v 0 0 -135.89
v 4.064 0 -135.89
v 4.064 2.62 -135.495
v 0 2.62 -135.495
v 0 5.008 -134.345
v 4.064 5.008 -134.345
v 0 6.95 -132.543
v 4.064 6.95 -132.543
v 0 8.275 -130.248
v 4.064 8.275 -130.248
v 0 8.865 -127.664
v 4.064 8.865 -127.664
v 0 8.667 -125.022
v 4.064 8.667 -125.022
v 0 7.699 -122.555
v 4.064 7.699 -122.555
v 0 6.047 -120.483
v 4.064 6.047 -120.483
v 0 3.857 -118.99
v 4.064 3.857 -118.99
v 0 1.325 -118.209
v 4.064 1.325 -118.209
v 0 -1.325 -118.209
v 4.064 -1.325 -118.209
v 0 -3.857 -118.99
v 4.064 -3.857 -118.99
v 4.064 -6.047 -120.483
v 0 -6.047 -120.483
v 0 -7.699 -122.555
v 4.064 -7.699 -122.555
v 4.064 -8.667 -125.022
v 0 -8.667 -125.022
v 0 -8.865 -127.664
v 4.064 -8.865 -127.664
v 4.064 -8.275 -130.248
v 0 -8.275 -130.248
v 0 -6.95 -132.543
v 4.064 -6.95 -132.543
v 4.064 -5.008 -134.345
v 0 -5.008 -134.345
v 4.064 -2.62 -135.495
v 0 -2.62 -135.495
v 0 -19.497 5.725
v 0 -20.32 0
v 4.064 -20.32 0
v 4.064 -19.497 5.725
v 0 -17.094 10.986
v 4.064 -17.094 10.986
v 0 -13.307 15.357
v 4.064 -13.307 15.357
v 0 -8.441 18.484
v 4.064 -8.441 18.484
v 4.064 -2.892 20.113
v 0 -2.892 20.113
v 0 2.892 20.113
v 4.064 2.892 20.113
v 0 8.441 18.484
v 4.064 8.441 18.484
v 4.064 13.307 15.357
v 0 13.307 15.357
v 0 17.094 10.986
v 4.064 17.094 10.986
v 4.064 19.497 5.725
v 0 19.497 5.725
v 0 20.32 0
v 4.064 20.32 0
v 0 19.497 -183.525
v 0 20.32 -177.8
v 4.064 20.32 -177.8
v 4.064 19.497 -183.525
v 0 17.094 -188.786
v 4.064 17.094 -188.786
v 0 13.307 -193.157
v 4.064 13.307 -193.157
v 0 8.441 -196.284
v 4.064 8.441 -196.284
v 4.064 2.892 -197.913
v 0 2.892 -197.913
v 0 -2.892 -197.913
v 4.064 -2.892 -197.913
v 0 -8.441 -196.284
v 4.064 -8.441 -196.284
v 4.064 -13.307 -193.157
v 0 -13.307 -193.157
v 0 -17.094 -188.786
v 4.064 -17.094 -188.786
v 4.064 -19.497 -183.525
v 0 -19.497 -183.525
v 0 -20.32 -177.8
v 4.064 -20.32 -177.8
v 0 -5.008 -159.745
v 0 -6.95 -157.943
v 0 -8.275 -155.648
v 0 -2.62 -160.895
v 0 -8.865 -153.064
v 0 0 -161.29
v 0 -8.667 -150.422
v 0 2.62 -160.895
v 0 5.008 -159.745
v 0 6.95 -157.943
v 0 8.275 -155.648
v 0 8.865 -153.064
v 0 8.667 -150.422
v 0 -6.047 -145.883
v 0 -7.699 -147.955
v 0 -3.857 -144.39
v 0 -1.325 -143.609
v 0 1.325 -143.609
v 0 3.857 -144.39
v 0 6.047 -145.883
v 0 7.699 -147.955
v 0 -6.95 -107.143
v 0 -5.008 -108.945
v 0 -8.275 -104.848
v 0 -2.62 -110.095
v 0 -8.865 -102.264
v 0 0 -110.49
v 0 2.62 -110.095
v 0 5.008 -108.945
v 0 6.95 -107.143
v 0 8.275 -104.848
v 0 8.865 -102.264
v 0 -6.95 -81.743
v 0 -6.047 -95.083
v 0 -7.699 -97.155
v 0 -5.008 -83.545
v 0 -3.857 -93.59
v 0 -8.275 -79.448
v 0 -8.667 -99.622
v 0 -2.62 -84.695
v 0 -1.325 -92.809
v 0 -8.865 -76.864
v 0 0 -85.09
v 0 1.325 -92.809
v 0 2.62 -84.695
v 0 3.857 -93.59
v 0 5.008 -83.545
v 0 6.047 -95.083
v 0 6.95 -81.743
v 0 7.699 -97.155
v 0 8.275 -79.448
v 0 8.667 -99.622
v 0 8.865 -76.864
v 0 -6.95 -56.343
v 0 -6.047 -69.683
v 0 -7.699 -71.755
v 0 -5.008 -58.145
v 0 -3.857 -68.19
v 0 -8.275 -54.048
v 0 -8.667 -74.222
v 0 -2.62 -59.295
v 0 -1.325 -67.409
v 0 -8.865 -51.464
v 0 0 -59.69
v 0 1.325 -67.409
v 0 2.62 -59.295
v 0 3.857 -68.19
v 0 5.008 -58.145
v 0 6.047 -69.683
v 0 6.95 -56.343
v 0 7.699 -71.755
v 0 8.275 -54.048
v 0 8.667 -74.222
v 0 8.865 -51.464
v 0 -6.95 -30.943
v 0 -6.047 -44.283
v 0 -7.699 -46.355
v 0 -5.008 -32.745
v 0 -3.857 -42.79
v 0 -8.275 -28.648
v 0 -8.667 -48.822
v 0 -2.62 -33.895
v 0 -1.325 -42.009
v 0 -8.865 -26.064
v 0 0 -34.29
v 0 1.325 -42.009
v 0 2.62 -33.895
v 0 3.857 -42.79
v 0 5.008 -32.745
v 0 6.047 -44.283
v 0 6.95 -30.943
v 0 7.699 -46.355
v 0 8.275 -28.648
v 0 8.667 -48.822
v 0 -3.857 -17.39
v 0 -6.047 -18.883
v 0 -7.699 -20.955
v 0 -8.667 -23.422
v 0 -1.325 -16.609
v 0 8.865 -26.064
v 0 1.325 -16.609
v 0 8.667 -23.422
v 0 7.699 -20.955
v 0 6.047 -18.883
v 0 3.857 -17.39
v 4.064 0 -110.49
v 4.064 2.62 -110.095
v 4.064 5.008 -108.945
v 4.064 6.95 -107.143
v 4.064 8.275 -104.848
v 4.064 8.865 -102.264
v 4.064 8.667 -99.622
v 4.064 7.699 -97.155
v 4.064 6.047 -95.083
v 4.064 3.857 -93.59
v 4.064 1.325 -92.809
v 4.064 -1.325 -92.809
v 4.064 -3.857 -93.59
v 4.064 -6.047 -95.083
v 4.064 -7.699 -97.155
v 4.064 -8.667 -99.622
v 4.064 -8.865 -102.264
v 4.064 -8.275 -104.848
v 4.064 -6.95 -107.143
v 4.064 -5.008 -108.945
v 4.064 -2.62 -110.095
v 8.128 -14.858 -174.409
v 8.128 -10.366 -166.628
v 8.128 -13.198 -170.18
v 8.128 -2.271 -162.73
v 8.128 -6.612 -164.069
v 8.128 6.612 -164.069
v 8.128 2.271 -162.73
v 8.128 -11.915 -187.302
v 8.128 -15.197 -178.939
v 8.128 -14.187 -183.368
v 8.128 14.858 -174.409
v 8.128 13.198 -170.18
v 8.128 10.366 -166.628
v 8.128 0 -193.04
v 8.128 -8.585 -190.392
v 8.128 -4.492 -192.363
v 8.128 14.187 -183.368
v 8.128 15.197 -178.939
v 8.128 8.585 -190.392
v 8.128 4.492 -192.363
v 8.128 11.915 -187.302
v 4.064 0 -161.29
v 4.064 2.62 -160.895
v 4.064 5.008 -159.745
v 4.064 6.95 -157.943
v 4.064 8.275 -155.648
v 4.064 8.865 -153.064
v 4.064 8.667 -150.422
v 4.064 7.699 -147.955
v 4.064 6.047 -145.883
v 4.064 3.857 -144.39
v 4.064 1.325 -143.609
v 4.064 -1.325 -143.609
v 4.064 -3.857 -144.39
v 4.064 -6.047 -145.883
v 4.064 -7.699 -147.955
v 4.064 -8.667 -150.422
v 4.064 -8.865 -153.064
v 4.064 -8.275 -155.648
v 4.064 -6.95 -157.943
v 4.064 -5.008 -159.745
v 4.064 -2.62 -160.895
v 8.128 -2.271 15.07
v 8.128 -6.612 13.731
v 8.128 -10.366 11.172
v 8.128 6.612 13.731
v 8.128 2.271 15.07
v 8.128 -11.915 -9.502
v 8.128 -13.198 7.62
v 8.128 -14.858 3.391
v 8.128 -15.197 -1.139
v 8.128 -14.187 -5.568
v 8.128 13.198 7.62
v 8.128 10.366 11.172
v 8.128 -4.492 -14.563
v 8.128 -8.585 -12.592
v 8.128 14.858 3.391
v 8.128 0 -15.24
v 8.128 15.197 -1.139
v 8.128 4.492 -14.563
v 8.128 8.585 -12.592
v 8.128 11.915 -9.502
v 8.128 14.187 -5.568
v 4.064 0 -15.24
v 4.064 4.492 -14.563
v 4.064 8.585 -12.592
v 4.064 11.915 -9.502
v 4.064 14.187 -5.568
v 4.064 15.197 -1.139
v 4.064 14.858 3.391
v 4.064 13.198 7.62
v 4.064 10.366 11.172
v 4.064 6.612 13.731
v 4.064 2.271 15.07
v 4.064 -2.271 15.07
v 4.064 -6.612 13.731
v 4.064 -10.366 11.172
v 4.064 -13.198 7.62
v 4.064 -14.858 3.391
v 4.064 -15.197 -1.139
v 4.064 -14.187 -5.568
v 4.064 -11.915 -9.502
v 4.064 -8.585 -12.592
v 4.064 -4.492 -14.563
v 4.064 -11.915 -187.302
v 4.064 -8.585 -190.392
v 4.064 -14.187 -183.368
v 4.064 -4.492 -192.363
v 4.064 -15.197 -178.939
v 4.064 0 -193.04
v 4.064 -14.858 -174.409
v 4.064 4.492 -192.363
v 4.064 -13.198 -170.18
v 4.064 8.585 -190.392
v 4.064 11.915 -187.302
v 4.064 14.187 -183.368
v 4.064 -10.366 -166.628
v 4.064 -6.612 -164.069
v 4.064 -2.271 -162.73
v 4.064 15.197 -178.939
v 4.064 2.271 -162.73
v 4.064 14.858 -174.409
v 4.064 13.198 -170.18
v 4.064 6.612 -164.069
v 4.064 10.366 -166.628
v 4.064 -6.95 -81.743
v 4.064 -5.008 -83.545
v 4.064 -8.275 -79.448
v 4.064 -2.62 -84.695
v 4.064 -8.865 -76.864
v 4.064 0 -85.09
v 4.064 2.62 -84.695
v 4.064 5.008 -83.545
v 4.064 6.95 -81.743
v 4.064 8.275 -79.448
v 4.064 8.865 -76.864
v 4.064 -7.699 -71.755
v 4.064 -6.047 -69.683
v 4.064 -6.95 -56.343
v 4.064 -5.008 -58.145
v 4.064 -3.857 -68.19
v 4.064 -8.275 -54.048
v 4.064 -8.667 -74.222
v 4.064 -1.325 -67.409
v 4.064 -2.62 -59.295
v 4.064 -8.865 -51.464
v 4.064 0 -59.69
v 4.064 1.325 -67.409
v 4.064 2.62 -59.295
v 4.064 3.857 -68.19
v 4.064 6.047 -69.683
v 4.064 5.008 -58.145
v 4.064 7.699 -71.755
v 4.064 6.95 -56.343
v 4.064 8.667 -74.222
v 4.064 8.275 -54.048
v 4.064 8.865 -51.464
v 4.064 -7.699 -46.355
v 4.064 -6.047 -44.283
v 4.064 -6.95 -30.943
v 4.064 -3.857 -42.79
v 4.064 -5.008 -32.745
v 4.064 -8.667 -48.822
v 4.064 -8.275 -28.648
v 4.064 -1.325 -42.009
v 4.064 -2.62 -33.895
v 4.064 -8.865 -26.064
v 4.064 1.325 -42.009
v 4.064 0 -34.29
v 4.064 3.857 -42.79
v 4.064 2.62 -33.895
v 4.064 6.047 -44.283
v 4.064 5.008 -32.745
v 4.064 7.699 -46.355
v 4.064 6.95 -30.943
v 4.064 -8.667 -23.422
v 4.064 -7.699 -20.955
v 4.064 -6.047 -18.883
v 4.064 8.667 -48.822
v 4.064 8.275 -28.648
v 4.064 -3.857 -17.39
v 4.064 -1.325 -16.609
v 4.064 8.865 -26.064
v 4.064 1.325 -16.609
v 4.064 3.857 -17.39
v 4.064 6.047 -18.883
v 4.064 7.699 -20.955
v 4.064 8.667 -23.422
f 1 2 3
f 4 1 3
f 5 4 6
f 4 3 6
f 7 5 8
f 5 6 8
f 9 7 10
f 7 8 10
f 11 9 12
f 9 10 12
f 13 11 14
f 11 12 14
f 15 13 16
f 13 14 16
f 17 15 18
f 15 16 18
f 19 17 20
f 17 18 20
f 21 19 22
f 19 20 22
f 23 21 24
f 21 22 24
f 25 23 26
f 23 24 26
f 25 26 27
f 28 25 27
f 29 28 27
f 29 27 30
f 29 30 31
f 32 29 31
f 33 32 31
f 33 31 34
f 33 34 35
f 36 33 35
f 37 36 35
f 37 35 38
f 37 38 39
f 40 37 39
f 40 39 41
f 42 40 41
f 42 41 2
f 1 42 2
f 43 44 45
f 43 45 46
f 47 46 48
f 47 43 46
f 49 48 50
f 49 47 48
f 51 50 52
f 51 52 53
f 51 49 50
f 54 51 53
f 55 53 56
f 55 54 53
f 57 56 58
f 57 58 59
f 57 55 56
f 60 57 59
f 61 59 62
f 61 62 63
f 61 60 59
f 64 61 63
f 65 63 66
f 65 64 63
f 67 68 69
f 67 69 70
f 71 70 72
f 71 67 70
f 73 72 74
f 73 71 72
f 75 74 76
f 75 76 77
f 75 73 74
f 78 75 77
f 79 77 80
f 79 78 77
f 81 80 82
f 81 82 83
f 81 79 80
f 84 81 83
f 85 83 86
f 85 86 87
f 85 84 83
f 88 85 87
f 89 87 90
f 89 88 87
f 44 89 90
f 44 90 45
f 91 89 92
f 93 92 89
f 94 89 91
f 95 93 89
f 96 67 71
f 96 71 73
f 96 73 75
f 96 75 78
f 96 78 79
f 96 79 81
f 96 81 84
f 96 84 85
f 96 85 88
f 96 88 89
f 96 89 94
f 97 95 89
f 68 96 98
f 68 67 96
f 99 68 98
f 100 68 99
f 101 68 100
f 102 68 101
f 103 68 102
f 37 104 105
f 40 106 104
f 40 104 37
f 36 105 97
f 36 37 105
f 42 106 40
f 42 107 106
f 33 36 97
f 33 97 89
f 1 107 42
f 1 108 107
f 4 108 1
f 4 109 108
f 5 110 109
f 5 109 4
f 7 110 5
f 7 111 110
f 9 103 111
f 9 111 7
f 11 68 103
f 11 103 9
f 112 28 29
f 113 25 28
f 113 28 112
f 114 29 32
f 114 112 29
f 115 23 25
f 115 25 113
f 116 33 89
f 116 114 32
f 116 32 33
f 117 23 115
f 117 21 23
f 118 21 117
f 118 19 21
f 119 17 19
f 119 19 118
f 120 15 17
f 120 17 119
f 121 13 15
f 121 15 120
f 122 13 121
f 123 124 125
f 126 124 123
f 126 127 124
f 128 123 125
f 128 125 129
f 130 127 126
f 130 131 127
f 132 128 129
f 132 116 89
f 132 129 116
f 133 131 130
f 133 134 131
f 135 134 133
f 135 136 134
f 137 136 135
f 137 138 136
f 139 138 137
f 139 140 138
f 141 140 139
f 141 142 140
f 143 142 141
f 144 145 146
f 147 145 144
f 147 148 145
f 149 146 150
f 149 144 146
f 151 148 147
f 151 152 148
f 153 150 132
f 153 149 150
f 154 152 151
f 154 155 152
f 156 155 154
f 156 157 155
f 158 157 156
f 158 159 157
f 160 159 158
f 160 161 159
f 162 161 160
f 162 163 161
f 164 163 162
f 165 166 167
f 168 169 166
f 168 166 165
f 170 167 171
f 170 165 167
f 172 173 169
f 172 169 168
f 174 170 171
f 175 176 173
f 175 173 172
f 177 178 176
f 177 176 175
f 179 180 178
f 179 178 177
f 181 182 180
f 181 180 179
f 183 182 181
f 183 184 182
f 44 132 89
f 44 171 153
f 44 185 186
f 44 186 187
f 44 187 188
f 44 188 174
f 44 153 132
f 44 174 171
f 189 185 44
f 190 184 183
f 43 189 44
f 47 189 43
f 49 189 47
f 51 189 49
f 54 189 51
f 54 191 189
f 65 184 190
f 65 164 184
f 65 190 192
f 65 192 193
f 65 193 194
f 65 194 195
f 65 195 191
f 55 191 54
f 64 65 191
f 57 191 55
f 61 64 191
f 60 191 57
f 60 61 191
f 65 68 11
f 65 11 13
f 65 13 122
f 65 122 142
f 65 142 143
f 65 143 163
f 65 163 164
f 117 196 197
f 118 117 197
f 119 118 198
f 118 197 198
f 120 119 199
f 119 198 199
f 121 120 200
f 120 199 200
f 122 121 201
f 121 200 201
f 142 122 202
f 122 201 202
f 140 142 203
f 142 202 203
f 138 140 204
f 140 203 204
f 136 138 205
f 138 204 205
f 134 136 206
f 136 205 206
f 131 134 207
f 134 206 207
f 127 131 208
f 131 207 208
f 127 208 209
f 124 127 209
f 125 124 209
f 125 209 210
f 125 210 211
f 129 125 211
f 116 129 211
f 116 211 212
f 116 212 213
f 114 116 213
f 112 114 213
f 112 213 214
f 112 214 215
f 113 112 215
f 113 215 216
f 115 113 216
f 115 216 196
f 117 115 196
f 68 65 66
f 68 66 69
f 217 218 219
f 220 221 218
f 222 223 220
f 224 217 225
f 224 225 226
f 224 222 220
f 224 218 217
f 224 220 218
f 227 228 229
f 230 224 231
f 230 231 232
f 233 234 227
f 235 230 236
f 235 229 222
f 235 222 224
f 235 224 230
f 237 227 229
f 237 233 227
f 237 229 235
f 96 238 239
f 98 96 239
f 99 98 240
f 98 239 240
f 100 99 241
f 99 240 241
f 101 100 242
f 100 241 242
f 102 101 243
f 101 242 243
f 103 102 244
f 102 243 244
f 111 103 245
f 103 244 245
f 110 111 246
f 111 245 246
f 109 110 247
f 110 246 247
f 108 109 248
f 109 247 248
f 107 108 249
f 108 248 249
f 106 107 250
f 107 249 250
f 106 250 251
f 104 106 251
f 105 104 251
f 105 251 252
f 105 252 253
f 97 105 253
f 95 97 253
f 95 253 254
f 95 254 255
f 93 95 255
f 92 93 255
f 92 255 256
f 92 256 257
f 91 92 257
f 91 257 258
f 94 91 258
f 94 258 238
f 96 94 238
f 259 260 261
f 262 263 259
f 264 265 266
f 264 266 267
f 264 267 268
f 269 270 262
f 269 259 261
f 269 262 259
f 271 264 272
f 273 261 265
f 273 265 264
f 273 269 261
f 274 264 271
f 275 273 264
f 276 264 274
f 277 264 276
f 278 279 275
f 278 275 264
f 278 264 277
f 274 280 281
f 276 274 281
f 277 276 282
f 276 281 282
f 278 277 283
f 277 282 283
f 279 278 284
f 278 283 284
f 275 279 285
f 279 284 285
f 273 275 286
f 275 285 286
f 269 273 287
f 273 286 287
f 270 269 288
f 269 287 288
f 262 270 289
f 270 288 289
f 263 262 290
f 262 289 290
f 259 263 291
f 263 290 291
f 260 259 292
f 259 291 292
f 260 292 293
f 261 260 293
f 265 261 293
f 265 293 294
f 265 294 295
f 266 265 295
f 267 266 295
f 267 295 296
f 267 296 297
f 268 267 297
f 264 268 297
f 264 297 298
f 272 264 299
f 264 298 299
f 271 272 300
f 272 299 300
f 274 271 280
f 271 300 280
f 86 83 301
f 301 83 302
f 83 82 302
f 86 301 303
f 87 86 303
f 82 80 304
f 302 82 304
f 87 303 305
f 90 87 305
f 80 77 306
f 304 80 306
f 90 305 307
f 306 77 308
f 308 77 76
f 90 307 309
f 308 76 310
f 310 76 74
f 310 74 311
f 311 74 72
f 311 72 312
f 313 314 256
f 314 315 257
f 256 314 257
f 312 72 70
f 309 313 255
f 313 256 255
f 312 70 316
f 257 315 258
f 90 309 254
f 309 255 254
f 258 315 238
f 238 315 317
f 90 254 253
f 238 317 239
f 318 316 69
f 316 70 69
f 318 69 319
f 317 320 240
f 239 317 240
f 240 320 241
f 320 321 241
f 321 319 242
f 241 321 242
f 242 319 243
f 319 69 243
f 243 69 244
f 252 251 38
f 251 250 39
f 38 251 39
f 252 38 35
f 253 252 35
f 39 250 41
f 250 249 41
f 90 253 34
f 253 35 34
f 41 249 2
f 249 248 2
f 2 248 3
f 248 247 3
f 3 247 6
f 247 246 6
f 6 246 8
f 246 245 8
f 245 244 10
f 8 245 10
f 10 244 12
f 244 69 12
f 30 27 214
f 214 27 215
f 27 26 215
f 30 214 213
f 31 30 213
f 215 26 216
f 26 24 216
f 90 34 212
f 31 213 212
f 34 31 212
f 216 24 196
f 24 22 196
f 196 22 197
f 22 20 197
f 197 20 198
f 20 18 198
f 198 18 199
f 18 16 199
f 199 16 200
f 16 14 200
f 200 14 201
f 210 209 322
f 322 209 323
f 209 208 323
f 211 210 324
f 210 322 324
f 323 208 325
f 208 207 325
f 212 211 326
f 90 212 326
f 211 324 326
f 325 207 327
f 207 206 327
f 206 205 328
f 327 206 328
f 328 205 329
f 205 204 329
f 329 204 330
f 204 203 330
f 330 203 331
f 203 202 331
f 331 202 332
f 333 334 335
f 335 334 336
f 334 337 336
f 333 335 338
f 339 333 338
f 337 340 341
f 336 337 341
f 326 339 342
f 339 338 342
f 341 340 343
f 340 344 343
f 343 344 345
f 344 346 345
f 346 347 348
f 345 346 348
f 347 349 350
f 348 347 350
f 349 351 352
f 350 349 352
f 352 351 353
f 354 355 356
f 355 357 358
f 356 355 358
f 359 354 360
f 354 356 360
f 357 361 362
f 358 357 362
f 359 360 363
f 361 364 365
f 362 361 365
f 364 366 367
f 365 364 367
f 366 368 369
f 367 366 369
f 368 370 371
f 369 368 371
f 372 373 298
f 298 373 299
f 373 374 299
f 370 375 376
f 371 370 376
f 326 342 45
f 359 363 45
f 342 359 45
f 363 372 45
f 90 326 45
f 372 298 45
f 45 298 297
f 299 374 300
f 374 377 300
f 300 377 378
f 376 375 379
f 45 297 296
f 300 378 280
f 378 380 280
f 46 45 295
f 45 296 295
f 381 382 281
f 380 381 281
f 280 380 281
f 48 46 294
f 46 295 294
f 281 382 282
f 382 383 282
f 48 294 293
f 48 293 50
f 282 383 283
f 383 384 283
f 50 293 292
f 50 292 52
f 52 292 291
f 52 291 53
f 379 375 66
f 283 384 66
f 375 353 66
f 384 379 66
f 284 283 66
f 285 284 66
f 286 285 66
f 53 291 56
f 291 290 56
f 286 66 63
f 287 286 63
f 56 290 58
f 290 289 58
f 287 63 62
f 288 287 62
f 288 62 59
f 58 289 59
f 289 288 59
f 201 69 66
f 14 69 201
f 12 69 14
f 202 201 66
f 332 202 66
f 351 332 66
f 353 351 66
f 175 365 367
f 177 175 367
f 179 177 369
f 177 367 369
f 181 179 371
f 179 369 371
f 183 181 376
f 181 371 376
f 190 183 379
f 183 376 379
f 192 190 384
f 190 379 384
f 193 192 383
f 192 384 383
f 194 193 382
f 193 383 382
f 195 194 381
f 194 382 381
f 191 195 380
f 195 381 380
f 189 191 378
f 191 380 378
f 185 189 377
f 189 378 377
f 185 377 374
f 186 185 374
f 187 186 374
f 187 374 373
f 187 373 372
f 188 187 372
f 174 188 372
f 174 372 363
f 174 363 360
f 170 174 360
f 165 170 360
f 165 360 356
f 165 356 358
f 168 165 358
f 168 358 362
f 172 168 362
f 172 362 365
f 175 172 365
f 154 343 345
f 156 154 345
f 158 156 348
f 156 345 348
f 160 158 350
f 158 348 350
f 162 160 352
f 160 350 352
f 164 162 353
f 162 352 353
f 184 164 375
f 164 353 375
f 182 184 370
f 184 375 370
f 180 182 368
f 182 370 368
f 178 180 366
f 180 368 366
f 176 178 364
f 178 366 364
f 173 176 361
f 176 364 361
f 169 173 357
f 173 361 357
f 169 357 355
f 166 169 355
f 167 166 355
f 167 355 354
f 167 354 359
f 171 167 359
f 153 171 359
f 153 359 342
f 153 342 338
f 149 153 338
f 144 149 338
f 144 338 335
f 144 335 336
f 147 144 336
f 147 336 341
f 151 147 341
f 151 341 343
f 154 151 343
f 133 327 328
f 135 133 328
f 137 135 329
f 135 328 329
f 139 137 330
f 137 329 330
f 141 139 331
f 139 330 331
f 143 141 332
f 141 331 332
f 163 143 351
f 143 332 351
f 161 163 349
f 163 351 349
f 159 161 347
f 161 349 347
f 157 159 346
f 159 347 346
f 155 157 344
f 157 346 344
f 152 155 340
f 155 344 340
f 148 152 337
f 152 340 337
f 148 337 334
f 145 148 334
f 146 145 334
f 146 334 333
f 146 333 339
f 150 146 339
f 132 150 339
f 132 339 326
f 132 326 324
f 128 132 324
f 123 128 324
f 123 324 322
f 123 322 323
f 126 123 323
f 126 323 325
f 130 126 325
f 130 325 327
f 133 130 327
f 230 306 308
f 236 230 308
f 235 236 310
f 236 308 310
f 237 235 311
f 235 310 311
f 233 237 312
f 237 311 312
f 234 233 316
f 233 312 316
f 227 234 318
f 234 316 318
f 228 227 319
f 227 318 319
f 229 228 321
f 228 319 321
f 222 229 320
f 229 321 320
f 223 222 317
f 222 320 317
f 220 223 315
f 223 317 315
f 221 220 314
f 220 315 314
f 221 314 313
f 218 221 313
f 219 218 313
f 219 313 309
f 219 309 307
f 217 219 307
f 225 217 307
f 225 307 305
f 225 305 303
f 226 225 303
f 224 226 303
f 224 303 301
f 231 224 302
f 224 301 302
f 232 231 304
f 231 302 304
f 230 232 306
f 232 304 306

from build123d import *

# Parameters (mm, degrees)
BOSS_EXTRUDE1_DEPTH = 4.064
SKETCH2_R           = 15.24
BOSS_EXTRUDE2_DEPTH = 4.064
SKETCH3_R           = 8.89
CUT_EXTRUDE1_DEPTH  = 5.064
LPATTERN1_COUNT     = 6
LPATTERN1_PITCH     = 25.4


with BuildPart() as part:
    # Sketch1 → Boss-Extrude1 (new body)
    with BuildSketch(Plane(origin=(0, 0, 0), x_dir=(0, 0, -1), z_dir=(1, 0, 0))):
        with BuildLine():
            Line((0, 20.32), (177.8, 20.32))
            ThreePointArc((177.8, 20.32), (198.12, 0), (177.8, -20.32))
            Line((177.8, -20.32), (0, -20.32))
            ThreePointArc((0, -20.32), (-20.32, 0), (0, 20.32))
        make_face()
    extrude(amount=BOSS_EXTRUDE1_DEPTH)

    # Sketch2 → Boss-Extrude2 (add)
    with BuildSketch(Plane(origin=(4.064, 0, 0), x_dir=(0, 0, -1), z_dir=(1, 0, 0))):
        Circle(SKETCH2_R)
        with Locations((177.8, 0)):
            Circle(SKETCH2_R)
    extrude(amount=BOSS_EXTRUDE2_DEPTH)

    # Sketch3 → Cut-Extrude1 (cut, through all)
    with BuildSketch(Plane(origin=(4.064, 0, 0), x_dir=(0, 0, -1), z_dir=(1, 0, 0))):
        with Locations((25.4, 0)):
            Circle(SKETCH3_R)
    cut_extrude1 = extrude(amount=-CUT_EXTRUDE1_DEPTH, mode=Mode.SUBTRACT)

    # LPattern1: Cut-Extrude1 ×6
    with Locations(*[(0, 0, -i * LPATTERN1_PITCH) for i in range(1, LPATTERN1_COUNT)]):
        add(cut_extrude1, mode=Mode.SUBTRACT)


solid = part.part
